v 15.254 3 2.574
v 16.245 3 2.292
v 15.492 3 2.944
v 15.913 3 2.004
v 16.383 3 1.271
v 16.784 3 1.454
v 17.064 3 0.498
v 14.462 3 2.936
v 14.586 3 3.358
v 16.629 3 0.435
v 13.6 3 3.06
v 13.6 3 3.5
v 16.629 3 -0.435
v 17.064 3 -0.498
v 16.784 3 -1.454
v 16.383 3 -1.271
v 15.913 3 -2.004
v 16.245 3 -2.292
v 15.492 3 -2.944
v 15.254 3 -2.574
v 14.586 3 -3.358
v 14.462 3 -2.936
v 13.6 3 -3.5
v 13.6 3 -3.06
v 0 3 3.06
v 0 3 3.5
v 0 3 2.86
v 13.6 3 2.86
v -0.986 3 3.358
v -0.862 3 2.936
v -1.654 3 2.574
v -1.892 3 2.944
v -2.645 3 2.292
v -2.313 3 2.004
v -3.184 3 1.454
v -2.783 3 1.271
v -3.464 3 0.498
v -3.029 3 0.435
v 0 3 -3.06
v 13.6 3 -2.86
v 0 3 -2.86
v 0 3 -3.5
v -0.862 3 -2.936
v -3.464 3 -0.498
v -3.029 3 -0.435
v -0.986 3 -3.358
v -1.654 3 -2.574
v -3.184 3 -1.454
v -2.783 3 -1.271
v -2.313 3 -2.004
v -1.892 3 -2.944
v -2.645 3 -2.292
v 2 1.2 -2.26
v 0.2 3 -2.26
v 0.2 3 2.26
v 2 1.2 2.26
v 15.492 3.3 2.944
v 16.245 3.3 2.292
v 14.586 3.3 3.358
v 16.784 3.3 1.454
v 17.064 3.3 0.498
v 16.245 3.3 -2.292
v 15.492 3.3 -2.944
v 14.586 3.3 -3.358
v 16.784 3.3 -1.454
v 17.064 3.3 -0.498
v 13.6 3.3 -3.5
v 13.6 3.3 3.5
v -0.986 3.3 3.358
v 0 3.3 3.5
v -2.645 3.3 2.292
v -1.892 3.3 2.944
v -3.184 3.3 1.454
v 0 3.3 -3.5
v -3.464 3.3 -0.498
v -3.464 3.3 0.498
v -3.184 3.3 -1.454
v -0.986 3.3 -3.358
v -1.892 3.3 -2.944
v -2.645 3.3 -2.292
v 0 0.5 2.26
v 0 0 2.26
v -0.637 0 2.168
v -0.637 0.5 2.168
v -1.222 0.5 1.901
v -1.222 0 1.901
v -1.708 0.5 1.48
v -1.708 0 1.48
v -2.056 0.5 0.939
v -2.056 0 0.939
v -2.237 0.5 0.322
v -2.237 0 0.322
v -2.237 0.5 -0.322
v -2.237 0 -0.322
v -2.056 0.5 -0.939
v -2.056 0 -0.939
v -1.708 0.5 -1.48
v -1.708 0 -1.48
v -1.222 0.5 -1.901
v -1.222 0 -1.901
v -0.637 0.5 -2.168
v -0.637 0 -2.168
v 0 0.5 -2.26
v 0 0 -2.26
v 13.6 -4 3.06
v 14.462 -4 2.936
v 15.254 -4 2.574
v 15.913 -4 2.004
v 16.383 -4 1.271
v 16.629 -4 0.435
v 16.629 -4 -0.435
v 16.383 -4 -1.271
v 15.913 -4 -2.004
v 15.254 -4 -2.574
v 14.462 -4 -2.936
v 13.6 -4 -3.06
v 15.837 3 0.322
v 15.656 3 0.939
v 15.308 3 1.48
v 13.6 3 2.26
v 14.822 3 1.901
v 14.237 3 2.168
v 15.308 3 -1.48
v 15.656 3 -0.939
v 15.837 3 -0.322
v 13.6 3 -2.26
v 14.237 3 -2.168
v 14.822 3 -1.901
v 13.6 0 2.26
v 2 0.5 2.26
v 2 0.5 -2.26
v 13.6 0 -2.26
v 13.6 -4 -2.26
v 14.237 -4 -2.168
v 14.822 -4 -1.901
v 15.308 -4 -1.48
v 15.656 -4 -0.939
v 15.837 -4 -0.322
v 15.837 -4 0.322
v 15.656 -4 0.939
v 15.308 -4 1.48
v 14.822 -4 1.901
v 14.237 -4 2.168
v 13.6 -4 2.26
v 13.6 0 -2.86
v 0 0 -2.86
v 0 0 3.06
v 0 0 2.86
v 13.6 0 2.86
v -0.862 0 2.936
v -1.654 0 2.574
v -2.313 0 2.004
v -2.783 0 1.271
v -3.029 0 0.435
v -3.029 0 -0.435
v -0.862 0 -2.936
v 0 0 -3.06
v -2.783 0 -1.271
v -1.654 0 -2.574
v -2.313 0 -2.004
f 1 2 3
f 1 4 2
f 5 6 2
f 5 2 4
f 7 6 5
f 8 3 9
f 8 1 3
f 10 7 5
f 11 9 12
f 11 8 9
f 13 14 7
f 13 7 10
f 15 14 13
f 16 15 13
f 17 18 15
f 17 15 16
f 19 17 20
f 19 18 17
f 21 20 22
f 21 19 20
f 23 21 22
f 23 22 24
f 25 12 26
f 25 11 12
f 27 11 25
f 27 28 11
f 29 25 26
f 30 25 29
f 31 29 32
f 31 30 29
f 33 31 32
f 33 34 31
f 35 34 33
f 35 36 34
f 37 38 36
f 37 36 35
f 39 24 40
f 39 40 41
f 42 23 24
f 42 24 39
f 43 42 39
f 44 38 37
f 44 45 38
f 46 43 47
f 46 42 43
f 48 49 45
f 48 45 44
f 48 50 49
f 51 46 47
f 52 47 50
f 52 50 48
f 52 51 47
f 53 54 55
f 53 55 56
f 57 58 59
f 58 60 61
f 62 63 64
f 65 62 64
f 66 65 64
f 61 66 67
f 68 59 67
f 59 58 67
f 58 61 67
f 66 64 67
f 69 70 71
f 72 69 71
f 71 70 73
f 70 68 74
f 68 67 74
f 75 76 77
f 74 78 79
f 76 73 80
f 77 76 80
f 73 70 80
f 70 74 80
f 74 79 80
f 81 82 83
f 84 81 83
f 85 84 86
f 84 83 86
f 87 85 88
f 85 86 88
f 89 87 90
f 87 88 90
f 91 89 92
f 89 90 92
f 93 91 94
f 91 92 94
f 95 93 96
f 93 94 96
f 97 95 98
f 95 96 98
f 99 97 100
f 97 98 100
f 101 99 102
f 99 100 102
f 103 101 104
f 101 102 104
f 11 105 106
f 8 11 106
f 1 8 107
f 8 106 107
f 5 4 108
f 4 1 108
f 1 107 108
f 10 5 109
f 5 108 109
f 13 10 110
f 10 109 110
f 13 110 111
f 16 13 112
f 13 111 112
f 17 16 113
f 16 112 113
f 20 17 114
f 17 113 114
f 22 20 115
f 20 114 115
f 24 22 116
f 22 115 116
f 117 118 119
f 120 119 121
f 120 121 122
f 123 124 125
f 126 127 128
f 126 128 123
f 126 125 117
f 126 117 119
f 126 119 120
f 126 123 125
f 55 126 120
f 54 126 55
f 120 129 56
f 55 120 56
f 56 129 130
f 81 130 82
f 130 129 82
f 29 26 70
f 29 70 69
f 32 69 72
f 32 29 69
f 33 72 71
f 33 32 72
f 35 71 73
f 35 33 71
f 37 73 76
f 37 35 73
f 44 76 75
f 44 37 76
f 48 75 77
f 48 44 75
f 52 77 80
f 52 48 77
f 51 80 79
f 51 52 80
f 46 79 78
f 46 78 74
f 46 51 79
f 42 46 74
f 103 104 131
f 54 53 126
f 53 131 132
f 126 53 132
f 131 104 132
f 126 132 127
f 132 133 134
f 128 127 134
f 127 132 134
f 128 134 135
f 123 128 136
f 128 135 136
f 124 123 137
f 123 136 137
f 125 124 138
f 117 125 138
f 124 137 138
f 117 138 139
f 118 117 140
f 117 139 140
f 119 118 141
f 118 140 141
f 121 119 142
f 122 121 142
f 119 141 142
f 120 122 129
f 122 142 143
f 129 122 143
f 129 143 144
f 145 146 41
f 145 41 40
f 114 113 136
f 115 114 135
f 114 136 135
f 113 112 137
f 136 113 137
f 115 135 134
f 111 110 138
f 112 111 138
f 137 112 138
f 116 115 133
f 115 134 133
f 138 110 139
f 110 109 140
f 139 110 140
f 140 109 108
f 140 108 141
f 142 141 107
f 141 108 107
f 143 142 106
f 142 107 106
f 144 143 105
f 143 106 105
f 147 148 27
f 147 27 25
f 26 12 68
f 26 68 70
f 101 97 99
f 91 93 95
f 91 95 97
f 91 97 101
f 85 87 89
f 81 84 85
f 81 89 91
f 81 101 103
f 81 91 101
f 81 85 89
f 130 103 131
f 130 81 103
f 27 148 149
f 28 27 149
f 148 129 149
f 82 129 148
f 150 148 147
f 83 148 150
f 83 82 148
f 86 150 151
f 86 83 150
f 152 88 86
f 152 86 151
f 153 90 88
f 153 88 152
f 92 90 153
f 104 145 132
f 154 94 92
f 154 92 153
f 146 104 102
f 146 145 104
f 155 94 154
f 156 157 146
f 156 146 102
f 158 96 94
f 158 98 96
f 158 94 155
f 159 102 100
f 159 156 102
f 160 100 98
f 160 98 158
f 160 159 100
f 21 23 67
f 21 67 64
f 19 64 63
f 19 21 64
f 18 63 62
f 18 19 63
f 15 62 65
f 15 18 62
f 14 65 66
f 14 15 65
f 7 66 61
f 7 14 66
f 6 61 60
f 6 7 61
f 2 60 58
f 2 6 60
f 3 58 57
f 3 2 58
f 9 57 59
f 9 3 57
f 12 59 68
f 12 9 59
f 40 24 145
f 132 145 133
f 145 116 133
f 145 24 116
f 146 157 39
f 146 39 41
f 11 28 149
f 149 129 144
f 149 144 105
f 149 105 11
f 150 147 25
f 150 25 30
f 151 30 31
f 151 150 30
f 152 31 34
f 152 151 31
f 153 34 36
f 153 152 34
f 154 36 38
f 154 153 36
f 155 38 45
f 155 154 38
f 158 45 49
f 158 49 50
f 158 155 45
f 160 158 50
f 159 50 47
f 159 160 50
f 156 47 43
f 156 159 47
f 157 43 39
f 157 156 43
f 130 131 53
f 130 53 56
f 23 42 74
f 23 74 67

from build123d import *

# Parameters (mm, degrees)
EXTRUDE_1_DEPTH     = 3
EXTRUDE_1_2_DEPTH   = 0.3
EXTRUDE_START       = 2.5
EXTRUDE_2_DEPTH     = 2.5
CUT_EXTRUDE_1_DEPTH = 4.52
EXTRUDE_START_2     = 4
EXTRUDE_2_2_DEPTH   = 4
SKETCH_6_W          = 13.6
SKETCH_6_H          = 0.2
CUT_EXTRUDE_2_DEPTH = 3


with BuildPart() as part:
    # Эскиз1 → Extrude 1 (new body)
    with BuildSketch(Plane(origin=(0, 0, 0), x_dir=(1, 0, 0), z_dir=(0, 1, 0))):
        with BuildLine():
            Line((13.6, -3.06), (0, -3.06))
            ThreePointArc((0, -3.06), (-3.06, 0), (0, 3.06))
            Line((0, 3.06), (13.6, 3.06))
            ThreePointArc((13.6, 3.06), (16.66, 0), (13.6, -3.06))
        make_face()
        with BuildLine():
            Line((13.6, -2.26), (0, -2.26))
            ThreePointArc((0, -2.26), (-2.26, 0), (0, 2.26))
            Line((0, 2.26), (13.6, 2.26))
            ThreePointArc((13.6, 2.26), (15.86, 0), (13.6, -2.26))
        make_face(mode=Mode.SUBTRACT)
    extrude(amount=EXTRUDE_1_DEPTH)

    # Эскиз2 → Extrude 1 2 (add)
    with BuildSketch(Plane(origin=(0, 3, 0), x_dir=(1, 0, 0), z_dir=(0, 1, 0))):
        with BuildLine():
            Line((0, 3.5), (13.6, 3.5))
            ThreePointArc((13.6, 3.5), (17.1, 0), (13.6, -3.5))
            Line((13.6, -3.5), (0, -3.5))
            ThreePointArc((0, -3.5), (-3.5, 0), (0, 3.5))
        make_face()
    extrude(amount=EXTRUDE_1_2_DEPTH)

    # Эскиз3 → Extrude 2 (add)
    with BuildSketch(Plane.XZ.offset(-3).offset(EXTRUDE_START)):
        with BuildLine():
            Line((0, -2.26), (2, -2.26))
            Line((2, -2.26), (2, 2.26))
            Line((2, 2.26), (0, 2.26))
            ThreePointArc((0, 2.26), (-2.26, 0), (0, -2.26))
        make_face()
    extrude(amount=-EXTRUDE_2_DEPTH)

    # Эскиз4 → Вырез-Вытянуть1 (cut)
    with BuildSketch(Plane.XY.offset(-2.26)):
        Polygon((2, 3), (0.2, 3), (2, 1.2), align=None)
    extrude(amount=CUT_EXTRUDE_1_DEPTH, mode=Mode.SUBTRACT)

    # Эскиз5 → Extrude 2 2 (add)
    with BuildSketch(Plane.XZ.offset(EXTRUDE_START_2)):
        with BuildLine():
            ThreePointArc((13.6, -2.26), (15.86, 0), (13.6, 2.26))
            Line((13.6, 2.26), (13.6, 3.06))
            ThreePointArc((13.6, 3.06), (16.66, 0), (13.6, -3.06))
            Line((13.6, -3.06), (13.6, -2.26))
        make_face()
    extrude(amount=-EXTRUDE_2_2_DEPTH)

    # Эскиз6 → Вырез-Вытянуть2 (cut)
    with BuildSketch(Plane.XZ):
        with Locations((6.8, 2.96)):
            Rectangle(SKETCH_6_W, SKETCH_6_H)
        with Locations((6.8, -2.96)):
            Rectangle(SKETCH_6_W, SKETCH_6_H)
    extrude(amount=-CUT_EXTRUDE_2_DEPTH, mode=Mode.SUBTRACT)


solid = part.part
